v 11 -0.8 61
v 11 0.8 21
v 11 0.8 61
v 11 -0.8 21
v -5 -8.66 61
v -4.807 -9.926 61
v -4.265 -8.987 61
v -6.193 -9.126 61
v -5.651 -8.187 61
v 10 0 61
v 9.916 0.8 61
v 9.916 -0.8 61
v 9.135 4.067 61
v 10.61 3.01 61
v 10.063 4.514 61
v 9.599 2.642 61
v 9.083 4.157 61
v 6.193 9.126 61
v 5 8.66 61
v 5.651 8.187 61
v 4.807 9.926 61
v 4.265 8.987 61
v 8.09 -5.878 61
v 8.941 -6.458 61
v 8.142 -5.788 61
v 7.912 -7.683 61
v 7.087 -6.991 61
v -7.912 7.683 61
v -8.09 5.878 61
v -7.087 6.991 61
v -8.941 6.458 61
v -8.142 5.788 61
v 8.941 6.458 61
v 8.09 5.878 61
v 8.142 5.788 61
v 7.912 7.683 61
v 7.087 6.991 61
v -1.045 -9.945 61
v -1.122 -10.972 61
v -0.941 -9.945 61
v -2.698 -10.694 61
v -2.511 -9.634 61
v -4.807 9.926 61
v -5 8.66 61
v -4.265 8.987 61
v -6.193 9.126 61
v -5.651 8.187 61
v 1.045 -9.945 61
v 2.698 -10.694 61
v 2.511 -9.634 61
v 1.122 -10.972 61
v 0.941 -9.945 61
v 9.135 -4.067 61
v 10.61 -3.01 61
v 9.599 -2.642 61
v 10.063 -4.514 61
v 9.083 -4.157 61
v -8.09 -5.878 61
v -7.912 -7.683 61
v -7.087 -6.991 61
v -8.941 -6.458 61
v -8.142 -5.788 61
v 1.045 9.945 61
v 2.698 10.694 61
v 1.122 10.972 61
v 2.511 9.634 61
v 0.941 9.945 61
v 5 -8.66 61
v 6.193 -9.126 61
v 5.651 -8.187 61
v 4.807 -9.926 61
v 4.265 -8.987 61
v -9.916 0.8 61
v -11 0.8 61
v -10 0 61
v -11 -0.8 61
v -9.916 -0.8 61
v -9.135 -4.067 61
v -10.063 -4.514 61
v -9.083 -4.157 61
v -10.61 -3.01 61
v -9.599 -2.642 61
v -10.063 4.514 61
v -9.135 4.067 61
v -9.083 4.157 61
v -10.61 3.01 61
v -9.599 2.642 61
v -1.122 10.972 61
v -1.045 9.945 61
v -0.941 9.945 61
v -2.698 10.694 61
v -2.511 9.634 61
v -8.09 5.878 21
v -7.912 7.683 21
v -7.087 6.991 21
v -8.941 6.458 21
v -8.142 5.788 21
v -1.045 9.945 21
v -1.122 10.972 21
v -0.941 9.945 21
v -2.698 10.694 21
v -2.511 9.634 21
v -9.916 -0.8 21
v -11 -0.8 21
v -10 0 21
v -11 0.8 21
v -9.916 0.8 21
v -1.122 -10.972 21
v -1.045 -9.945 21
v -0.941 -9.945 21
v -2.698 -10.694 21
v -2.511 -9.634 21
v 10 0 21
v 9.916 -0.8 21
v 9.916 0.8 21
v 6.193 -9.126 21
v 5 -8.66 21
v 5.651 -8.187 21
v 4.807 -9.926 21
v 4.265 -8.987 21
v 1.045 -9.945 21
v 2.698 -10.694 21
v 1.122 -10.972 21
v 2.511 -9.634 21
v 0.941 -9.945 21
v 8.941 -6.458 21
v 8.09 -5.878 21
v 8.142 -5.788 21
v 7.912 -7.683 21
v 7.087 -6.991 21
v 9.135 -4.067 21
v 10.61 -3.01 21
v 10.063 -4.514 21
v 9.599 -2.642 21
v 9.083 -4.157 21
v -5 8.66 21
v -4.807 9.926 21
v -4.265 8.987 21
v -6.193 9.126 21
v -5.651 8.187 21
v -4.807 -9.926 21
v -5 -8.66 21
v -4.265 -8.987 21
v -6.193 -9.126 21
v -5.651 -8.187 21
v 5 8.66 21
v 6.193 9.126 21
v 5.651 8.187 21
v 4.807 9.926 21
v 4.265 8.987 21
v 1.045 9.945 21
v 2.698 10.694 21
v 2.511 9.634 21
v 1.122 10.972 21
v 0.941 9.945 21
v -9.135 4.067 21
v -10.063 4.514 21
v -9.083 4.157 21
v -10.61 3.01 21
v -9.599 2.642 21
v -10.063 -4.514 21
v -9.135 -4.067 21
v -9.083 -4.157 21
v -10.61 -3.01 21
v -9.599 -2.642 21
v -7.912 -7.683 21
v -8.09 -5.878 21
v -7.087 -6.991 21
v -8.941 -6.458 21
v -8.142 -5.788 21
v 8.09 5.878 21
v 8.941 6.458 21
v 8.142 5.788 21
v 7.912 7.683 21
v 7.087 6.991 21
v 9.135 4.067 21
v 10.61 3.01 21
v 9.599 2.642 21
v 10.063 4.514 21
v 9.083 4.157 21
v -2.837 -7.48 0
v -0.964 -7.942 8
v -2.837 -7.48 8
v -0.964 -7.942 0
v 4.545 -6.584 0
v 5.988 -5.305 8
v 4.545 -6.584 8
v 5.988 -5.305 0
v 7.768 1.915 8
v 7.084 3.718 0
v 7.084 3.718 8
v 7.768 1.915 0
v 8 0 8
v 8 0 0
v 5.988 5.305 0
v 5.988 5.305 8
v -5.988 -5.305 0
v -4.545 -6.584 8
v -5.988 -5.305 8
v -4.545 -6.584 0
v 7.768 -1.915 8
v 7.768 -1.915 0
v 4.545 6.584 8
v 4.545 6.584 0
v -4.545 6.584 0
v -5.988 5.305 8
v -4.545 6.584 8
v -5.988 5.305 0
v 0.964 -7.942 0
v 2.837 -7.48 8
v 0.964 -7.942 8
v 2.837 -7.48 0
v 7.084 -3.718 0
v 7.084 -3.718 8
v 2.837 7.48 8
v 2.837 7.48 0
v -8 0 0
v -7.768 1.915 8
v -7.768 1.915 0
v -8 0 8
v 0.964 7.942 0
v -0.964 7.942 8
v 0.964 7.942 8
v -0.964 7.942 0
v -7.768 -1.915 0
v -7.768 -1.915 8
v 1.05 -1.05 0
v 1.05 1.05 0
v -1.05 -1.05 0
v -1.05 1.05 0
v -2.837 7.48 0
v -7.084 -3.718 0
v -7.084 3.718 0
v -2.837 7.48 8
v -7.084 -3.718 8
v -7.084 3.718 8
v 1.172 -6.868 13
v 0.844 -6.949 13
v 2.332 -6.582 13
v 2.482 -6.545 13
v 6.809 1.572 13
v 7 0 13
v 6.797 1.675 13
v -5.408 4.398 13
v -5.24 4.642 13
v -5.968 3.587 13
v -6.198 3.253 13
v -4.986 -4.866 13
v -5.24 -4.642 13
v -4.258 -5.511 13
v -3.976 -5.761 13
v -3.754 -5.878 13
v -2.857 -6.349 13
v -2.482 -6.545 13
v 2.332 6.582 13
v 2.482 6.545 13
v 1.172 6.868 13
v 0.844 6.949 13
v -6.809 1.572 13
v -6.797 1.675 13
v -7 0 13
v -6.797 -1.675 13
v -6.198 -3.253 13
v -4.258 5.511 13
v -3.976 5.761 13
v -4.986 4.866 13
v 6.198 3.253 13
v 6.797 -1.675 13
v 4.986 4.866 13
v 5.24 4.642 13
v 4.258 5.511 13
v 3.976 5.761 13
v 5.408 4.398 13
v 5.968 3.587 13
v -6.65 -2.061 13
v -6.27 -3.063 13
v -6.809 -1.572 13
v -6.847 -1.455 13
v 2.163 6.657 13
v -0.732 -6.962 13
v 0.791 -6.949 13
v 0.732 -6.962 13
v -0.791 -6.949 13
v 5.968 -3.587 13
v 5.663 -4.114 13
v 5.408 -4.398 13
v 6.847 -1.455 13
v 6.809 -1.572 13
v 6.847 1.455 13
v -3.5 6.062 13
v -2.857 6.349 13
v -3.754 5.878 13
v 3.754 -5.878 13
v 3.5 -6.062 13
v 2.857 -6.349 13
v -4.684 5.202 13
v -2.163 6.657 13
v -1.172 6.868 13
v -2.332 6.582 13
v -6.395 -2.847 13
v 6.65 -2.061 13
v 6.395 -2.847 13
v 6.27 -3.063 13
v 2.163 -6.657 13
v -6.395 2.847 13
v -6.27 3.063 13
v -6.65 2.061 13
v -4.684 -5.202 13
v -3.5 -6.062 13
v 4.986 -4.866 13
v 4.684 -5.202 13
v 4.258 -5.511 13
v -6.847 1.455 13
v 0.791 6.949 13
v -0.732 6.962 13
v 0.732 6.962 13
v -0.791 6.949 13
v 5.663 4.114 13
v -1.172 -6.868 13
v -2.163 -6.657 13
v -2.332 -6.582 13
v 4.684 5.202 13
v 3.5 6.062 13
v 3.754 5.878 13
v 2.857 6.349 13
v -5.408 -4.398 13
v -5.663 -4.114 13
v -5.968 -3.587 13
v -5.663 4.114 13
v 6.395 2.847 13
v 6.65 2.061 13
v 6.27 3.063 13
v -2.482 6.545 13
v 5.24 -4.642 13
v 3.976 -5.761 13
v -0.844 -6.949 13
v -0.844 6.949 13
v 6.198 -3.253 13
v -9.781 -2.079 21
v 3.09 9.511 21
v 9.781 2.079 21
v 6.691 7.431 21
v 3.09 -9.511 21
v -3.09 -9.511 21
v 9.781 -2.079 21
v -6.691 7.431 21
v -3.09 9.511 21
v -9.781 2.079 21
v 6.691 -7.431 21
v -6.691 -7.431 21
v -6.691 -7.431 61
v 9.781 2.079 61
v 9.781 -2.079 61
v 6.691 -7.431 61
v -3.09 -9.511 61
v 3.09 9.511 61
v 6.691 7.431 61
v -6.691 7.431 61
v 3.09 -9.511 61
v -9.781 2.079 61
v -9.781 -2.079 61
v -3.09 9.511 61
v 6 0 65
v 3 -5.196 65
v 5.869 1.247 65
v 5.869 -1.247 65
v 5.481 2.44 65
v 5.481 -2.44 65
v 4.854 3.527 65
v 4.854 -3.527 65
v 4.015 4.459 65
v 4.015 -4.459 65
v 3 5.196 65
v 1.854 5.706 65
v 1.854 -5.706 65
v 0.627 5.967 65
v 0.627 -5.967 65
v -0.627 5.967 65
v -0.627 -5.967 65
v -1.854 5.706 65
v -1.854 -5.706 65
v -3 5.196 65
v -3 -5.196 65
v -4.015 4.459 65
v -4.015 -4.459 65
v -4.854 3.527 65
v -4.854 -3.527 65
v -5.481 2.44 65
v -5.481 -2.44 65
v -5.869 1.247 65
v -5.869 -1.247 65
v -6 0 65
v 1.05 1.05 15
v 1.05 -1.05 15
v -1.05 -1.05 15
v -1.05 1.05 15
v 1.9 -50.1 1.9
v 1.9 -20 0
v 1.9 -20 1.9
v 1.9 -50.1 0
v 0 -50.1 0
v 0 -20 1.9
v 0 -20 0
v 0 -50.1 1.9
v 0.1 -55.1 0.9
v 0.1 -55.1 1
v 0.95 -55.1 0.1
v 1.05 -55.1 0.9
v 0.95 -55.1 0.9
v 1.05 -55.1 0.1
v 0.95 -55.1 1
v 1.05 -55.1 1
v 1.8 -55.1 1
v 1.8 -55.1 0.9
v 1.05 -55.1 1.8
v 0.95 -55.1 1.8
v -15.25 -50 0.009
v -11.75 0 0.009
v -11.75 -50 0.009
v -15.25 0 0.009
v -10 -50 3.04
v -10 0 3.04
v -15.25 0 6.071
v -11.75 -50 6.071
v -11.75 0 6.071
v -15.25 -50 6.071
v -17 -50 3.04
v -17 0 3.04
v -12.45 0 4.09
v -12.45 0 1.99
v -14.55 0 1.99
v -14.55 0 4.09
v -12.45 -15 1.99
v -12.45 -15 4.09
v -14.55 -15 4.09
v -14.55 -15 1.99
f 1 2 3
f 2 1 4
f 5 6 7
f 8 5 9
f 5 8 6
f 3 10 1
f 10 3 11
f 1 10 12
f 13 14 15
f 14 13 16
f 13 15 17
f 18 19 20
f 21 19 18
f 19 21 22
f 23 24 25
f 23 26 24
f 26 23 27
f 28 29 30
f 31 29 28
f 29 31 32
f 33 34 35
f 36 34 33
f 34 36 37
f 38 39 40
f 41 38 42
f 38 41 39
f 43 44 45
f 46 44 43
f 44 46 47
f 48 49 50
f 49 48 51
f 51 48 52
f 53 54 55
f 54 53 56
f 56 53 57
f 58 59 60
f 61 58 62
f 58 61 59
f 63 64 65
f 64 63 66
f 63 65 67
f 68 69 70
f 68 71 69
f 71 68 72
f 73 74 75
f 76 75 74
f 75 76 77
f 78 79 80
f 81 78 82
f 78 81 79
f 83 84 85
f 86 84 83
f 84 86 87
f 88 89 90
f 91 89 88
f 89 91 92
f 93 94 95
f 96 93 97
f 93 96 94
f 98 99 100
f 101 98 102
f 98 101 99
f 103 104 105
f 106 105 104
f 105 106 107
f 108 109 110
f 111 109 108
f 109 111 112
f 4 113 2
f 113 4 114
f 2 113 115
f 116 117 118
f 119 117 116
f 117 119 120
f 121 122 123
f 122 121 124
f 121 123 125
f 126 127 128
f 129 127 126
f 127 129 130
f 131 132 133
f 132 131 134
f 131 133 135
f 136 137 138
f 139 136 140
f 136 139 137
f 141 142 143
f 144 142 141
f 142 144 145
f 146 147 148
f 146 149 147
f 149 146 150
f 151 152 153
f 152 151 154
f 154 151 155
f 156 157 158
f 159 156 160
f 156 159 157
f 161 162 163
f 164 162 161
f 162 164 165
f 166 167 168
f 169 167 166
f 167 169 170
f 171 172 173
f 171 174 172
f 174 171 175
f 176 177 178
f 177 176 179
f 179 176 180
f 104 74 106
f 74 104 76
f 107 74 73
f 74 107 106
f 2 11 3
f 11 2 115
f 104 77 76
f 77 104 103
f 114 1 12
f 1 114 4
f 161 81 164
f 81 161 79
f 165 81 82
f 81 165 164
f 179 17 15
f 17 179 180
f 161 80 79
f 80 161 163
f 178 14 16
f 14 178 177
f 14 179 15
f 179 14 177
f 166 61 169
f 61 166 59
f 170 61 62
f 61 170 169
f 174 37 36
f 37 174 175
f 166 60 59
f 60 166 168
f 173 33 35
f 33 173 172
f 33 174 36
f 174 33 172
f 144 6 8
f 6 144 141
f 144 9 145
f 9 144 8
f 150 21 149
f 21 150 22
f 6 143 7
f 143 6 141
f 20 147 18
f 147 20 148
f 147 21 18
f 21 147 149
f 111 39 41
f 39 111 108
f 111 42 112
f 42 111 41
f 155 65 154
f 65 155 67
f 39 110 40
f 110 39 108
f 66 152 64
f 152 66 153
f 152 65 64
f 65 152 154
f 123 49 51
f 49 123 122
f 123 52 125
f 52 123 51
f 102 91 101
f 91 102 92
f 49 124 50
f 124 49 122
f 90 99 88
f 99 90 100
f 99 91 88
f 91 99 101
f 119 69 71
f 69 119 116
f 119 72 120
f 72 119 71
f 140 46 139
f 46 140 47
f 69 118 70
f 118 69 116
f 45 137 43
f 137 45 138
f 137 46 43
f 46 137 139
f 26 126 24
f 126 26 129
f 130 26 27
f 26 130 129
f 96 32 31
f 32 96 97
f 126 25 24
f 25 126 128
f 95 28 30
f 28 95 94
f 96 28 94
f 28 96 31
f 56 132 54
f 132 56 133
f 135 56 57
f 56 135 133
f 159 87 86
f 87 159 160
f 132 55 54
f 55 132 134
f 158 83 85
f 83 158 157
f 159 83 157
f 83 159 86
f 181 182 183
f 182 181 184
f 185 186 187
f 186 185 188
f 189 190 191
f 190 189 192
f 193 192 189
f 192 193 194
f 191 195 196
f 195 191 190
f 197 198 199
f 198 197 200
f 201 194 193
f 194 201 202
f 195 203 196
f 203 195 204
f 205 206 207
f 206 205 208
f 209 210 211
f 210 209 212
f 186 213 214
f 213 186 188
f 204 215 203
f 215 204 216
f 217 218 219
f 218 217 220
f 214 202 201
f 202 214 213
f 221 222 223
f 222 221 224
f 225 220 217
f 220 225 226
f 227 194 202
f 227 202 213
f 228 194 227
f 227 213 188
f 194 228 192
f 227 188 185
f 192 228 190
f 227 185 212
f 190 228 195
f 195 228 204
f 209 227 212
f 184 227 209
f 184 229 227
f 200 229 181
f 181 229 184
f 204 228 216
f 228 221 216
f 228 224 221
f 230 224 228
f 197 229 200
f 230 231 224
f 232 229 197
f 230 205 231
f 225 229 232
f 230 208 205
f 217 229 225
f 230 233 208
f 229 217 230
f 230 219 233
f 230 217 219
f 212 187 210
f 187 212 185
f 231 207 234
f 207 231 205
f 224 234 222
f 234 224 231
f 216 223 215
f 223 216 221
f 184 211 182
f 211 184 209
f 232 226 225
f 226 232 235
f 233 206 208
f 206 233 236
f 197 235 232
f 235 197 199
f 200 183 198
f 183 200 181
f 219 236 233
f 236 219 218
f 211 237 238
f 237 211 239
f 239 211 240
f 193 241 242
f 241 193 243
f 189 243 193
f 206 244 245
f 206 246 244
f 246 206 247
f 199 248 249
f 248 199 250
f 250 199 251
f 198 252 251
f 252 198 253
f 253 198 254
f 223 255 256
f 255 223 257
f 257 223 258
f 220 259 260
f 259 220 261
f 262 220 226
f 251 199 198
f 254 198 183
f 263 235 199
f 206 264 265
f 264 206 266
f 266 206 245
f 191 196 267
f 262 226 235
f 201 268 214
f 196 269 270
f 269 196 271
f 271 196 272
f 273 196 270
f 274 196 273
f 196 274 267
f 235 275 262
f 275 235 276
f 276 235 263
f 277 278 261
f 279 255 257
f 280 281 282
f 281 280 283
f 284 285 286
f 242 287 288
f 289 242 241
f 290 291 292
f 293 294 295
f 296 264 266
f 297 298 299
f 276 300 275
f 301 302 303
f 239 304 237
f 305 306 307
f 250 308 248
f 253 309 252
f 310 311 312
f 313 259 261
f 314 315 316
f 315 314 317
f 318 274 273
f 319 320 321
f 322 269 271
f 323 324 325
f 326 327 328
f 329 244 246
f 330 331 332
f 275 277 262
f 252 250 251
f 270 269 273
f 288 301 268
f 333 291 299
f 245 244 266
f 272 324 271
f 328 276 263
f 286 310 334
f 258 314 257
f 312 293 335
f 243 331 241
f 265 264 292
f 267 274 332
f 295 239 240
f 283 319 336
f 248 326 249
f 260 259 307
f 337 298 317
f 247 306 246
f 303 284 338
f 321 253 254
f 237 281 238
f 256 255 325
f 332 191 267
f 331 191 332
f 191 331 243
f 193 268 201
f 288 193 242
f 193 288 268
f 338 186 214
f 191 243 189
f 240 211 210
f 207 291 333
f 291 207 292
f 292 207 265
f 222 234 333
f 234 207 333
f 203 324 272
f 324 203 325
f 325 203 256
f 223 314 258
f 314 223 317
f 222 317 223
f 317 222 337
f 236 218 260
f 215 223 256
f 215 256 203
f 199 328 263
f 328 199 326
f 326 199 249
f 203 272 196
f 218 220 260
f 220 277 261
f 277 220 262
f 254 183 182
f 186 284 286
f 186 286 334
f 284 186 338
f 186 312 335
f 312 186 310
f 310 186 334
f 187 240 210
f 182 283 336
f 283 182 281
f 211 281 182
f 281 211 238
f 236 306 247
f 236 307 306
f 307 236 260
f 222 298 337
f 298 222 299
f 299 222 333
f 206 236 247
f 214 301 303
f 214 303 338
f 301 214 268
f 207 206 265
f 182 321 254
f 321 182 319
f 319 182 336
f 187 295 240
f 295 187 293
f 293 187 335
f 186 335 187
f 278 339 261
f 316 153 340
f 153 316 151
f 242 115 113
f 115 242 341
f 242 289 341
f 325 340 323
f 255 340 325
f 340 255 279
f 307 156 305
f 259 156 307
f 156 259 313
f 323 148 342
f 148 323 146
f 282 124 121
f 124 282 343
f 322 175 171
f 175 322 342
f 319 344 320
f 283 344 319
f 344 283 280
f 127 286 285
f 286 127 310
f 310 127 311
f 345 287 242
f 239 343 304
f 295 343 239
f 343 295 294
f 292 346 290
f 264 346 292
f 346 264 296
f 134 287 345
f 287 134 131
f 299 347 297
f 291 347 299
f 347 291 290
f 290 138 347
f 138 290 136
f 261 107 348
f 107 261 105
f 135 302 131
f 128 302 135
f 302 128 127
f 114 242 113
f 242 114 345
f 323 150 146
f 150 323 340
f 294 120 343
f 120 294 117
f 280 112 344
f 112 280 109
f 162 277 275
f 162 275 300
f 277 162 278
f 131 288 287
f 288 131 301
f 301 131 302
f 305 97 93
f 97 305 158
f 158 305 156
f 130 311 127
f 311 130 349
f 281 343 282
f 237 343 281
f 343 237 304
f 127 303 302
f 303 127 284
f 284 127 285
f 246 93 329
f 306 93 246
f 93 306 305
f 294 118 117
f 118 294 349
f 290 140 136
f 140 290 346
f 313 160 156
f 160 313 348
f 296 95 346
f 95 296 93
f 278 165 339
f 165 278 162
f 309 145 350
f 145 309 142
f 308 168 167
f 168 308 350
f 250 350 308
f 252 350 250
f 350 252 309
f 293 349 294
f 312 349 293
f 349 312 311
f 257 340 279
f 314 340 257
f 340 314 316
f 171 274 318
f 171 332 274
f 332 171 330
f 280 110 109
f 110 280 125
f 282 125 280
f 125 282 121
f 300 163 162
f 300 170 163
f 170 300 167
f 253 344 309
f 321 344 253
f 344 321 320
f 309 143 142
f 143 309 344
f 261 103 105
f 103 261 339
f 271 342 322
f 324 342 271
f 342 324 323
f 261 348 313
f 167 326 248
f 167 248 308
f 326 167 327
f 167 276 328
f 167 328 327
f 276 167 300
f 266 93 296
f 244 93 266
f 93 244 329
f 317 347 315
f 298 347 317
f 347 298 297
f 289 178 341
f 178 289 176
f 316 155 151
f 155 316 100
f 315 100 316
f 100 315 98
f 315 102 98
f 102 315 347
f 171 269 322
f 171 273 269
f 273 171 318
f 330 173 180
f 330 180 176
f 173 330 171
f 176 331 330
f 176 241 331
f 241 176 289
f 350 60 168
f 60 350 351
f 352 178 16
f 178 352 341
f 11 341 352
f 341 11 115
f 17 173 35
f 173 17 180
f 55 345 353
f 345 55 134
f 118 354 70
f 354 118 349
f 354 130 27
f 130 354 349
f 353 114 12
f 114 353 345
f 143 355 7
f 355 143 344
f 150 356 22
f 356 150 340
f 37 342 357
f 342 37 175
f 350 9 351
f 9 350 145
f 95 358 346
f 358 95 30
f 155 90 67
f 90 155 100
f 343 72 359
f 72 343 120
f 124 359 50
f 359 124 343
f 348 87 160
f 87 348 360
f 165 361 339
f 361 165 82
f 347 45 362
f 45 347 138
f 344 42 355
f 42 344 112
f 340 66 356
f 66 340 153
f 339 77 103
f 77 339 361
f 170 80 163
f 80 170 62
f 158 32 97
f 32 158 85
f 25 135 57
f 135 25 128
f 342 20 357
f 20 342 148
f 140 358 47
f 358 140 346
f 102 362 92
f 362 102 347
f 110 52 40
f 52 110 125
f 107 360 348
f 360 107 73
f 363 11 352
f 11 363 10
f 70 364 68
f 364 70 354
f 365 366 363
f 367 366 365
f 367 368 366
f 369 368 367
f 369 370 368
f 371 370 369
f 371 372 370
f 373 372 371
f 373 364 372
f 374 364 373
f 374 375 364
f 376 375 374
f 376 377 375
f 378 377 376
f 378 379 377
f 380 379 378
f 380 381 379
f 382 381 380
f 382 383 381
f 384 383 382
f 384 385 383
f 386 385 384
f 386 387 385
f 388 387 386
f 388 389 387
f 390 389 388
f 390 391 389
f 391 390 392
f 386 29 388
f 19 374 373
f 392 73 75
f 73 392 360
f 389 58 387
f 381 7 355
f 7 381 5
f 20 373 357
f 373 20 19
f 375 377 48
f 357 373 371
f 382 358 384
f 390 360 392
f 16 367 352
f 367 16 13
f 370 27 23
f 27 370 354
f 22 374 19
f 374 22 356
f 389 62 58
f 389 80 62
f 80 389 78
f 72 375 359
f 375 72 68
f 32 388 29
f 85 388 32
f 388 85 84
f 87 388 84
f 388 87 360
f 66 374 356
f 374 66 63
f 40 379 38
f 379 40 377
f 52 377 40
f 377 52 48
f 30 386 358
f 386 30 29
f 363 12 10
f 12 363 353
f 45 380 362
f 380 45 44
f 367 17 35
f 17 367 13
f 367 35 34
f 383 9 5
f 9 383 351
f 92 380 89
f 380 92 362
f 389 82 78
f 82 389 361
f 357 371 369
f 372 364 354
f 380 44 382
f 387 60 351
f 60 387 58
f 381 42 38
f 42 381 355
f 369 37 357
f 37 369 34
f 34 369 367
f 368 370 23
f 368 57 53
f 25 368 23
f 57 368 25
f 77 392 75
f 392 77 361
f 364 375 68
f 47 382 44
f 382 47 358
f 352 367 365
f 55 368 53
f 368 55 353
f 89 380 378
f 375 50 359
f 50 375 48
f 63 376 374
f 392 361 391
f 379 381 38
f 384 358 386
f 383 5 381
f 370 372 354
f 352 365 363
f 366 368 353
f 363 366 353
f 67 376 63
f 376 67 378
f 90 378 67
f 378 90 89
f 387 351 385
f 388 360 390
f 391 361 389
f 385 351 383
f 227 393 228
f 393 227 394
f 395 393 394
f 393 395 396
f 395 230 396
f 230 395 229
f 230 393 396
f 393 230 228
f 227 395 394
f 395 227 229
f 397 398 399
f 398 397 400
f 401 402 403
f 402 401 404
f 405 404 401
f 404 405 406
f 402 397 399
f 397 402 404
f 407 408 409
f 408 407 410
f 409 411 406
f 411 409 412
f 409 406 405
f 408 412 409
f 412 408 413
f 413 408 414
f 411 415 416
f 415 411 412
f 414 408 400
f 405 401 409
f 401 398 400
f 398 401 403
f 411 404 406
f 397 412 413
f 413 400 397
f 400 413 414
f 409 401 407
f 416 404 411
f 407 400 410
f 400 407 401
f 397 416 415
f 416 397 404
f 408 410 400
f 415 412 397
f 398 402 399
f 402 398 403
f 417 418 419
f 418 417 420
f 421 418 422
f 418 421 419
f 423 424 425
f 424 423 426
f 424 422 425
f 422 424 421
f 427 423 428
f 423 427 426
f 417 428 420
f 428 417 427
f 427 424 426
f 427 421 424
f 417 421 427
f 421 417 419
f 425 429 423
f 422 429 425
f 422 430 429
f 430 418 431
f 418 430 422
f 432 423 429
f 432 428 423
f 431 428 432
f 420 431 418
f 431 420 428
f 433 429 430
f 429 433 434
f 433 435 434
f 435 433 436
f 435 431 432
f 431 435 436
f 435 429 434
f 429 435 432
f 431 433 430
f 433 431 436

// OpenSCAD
module tip() {
  translate([-0.95,-0.95,0]) cube([1.9,1.9,30]); 
  translate([0,0,30]) {
    hull() {
      translate([-0.95,-0.95,0]) cube([1.9,1.9,0.1]);
      translate([0,-0.85,5]) cube([0.1,1.7,0.1]);
    }
  }
}

module philips_tip() {
  translate([-0.95,-0.95,0]) cube([1.9,1.9,30]); 
  translate([0,0,30]) {
    hull() {
      translate([-0.95,-0.95,0]) cube([1.9,1.9,0.1]); 
      translate([-0.85,-0.05,5]) cube([1.7,0.1,0.1]);
    }
    hull() {
      translate([-0.95,-0.95,0]) cube([1.9,1.9,0.1]);
      translate([0,-0.85,5]) cube([0.1,1.7,0.1]);
    }
  }
}

module handle() {
  difference() {
    union() {
      cylinder(r=8,h=8);
      translate([0,0,8]) cylinder(r1=8,r2=7,h=5);
      translate([0,0,13]) cylinder(r1=7,r2=10,h=8);
      translate([0,0,21]) cylinder(r=10,h=40);
      translate([0,0,61]) cylinder(r1=10,r2=6,h=4);
      for (i=[0:20:180]) {
        translate([0,0,41]) rotate([0,0,i]) cube([22,1.6,40],center=true);
      }
    }
    translate([-1.05,-1.05,-1]) cube([2.1,2.1,16]);
  }
}

module adapter() {
  difference() {
    cylinder(r=3.5,h=50,$fn=6);
    translate([-1.05,-1.05,-1]) cube([2.1,2.1,16]);
  }
}

handle();
// rotate([90,0,0]) translate([0.95,0.95,20]) tip();
rotate([90,0,0]) translate([0.95,0.95,20]) philips_tip();
rotate([90,0,0]) translate([-13.5,3.04,0]) adapter(); 
